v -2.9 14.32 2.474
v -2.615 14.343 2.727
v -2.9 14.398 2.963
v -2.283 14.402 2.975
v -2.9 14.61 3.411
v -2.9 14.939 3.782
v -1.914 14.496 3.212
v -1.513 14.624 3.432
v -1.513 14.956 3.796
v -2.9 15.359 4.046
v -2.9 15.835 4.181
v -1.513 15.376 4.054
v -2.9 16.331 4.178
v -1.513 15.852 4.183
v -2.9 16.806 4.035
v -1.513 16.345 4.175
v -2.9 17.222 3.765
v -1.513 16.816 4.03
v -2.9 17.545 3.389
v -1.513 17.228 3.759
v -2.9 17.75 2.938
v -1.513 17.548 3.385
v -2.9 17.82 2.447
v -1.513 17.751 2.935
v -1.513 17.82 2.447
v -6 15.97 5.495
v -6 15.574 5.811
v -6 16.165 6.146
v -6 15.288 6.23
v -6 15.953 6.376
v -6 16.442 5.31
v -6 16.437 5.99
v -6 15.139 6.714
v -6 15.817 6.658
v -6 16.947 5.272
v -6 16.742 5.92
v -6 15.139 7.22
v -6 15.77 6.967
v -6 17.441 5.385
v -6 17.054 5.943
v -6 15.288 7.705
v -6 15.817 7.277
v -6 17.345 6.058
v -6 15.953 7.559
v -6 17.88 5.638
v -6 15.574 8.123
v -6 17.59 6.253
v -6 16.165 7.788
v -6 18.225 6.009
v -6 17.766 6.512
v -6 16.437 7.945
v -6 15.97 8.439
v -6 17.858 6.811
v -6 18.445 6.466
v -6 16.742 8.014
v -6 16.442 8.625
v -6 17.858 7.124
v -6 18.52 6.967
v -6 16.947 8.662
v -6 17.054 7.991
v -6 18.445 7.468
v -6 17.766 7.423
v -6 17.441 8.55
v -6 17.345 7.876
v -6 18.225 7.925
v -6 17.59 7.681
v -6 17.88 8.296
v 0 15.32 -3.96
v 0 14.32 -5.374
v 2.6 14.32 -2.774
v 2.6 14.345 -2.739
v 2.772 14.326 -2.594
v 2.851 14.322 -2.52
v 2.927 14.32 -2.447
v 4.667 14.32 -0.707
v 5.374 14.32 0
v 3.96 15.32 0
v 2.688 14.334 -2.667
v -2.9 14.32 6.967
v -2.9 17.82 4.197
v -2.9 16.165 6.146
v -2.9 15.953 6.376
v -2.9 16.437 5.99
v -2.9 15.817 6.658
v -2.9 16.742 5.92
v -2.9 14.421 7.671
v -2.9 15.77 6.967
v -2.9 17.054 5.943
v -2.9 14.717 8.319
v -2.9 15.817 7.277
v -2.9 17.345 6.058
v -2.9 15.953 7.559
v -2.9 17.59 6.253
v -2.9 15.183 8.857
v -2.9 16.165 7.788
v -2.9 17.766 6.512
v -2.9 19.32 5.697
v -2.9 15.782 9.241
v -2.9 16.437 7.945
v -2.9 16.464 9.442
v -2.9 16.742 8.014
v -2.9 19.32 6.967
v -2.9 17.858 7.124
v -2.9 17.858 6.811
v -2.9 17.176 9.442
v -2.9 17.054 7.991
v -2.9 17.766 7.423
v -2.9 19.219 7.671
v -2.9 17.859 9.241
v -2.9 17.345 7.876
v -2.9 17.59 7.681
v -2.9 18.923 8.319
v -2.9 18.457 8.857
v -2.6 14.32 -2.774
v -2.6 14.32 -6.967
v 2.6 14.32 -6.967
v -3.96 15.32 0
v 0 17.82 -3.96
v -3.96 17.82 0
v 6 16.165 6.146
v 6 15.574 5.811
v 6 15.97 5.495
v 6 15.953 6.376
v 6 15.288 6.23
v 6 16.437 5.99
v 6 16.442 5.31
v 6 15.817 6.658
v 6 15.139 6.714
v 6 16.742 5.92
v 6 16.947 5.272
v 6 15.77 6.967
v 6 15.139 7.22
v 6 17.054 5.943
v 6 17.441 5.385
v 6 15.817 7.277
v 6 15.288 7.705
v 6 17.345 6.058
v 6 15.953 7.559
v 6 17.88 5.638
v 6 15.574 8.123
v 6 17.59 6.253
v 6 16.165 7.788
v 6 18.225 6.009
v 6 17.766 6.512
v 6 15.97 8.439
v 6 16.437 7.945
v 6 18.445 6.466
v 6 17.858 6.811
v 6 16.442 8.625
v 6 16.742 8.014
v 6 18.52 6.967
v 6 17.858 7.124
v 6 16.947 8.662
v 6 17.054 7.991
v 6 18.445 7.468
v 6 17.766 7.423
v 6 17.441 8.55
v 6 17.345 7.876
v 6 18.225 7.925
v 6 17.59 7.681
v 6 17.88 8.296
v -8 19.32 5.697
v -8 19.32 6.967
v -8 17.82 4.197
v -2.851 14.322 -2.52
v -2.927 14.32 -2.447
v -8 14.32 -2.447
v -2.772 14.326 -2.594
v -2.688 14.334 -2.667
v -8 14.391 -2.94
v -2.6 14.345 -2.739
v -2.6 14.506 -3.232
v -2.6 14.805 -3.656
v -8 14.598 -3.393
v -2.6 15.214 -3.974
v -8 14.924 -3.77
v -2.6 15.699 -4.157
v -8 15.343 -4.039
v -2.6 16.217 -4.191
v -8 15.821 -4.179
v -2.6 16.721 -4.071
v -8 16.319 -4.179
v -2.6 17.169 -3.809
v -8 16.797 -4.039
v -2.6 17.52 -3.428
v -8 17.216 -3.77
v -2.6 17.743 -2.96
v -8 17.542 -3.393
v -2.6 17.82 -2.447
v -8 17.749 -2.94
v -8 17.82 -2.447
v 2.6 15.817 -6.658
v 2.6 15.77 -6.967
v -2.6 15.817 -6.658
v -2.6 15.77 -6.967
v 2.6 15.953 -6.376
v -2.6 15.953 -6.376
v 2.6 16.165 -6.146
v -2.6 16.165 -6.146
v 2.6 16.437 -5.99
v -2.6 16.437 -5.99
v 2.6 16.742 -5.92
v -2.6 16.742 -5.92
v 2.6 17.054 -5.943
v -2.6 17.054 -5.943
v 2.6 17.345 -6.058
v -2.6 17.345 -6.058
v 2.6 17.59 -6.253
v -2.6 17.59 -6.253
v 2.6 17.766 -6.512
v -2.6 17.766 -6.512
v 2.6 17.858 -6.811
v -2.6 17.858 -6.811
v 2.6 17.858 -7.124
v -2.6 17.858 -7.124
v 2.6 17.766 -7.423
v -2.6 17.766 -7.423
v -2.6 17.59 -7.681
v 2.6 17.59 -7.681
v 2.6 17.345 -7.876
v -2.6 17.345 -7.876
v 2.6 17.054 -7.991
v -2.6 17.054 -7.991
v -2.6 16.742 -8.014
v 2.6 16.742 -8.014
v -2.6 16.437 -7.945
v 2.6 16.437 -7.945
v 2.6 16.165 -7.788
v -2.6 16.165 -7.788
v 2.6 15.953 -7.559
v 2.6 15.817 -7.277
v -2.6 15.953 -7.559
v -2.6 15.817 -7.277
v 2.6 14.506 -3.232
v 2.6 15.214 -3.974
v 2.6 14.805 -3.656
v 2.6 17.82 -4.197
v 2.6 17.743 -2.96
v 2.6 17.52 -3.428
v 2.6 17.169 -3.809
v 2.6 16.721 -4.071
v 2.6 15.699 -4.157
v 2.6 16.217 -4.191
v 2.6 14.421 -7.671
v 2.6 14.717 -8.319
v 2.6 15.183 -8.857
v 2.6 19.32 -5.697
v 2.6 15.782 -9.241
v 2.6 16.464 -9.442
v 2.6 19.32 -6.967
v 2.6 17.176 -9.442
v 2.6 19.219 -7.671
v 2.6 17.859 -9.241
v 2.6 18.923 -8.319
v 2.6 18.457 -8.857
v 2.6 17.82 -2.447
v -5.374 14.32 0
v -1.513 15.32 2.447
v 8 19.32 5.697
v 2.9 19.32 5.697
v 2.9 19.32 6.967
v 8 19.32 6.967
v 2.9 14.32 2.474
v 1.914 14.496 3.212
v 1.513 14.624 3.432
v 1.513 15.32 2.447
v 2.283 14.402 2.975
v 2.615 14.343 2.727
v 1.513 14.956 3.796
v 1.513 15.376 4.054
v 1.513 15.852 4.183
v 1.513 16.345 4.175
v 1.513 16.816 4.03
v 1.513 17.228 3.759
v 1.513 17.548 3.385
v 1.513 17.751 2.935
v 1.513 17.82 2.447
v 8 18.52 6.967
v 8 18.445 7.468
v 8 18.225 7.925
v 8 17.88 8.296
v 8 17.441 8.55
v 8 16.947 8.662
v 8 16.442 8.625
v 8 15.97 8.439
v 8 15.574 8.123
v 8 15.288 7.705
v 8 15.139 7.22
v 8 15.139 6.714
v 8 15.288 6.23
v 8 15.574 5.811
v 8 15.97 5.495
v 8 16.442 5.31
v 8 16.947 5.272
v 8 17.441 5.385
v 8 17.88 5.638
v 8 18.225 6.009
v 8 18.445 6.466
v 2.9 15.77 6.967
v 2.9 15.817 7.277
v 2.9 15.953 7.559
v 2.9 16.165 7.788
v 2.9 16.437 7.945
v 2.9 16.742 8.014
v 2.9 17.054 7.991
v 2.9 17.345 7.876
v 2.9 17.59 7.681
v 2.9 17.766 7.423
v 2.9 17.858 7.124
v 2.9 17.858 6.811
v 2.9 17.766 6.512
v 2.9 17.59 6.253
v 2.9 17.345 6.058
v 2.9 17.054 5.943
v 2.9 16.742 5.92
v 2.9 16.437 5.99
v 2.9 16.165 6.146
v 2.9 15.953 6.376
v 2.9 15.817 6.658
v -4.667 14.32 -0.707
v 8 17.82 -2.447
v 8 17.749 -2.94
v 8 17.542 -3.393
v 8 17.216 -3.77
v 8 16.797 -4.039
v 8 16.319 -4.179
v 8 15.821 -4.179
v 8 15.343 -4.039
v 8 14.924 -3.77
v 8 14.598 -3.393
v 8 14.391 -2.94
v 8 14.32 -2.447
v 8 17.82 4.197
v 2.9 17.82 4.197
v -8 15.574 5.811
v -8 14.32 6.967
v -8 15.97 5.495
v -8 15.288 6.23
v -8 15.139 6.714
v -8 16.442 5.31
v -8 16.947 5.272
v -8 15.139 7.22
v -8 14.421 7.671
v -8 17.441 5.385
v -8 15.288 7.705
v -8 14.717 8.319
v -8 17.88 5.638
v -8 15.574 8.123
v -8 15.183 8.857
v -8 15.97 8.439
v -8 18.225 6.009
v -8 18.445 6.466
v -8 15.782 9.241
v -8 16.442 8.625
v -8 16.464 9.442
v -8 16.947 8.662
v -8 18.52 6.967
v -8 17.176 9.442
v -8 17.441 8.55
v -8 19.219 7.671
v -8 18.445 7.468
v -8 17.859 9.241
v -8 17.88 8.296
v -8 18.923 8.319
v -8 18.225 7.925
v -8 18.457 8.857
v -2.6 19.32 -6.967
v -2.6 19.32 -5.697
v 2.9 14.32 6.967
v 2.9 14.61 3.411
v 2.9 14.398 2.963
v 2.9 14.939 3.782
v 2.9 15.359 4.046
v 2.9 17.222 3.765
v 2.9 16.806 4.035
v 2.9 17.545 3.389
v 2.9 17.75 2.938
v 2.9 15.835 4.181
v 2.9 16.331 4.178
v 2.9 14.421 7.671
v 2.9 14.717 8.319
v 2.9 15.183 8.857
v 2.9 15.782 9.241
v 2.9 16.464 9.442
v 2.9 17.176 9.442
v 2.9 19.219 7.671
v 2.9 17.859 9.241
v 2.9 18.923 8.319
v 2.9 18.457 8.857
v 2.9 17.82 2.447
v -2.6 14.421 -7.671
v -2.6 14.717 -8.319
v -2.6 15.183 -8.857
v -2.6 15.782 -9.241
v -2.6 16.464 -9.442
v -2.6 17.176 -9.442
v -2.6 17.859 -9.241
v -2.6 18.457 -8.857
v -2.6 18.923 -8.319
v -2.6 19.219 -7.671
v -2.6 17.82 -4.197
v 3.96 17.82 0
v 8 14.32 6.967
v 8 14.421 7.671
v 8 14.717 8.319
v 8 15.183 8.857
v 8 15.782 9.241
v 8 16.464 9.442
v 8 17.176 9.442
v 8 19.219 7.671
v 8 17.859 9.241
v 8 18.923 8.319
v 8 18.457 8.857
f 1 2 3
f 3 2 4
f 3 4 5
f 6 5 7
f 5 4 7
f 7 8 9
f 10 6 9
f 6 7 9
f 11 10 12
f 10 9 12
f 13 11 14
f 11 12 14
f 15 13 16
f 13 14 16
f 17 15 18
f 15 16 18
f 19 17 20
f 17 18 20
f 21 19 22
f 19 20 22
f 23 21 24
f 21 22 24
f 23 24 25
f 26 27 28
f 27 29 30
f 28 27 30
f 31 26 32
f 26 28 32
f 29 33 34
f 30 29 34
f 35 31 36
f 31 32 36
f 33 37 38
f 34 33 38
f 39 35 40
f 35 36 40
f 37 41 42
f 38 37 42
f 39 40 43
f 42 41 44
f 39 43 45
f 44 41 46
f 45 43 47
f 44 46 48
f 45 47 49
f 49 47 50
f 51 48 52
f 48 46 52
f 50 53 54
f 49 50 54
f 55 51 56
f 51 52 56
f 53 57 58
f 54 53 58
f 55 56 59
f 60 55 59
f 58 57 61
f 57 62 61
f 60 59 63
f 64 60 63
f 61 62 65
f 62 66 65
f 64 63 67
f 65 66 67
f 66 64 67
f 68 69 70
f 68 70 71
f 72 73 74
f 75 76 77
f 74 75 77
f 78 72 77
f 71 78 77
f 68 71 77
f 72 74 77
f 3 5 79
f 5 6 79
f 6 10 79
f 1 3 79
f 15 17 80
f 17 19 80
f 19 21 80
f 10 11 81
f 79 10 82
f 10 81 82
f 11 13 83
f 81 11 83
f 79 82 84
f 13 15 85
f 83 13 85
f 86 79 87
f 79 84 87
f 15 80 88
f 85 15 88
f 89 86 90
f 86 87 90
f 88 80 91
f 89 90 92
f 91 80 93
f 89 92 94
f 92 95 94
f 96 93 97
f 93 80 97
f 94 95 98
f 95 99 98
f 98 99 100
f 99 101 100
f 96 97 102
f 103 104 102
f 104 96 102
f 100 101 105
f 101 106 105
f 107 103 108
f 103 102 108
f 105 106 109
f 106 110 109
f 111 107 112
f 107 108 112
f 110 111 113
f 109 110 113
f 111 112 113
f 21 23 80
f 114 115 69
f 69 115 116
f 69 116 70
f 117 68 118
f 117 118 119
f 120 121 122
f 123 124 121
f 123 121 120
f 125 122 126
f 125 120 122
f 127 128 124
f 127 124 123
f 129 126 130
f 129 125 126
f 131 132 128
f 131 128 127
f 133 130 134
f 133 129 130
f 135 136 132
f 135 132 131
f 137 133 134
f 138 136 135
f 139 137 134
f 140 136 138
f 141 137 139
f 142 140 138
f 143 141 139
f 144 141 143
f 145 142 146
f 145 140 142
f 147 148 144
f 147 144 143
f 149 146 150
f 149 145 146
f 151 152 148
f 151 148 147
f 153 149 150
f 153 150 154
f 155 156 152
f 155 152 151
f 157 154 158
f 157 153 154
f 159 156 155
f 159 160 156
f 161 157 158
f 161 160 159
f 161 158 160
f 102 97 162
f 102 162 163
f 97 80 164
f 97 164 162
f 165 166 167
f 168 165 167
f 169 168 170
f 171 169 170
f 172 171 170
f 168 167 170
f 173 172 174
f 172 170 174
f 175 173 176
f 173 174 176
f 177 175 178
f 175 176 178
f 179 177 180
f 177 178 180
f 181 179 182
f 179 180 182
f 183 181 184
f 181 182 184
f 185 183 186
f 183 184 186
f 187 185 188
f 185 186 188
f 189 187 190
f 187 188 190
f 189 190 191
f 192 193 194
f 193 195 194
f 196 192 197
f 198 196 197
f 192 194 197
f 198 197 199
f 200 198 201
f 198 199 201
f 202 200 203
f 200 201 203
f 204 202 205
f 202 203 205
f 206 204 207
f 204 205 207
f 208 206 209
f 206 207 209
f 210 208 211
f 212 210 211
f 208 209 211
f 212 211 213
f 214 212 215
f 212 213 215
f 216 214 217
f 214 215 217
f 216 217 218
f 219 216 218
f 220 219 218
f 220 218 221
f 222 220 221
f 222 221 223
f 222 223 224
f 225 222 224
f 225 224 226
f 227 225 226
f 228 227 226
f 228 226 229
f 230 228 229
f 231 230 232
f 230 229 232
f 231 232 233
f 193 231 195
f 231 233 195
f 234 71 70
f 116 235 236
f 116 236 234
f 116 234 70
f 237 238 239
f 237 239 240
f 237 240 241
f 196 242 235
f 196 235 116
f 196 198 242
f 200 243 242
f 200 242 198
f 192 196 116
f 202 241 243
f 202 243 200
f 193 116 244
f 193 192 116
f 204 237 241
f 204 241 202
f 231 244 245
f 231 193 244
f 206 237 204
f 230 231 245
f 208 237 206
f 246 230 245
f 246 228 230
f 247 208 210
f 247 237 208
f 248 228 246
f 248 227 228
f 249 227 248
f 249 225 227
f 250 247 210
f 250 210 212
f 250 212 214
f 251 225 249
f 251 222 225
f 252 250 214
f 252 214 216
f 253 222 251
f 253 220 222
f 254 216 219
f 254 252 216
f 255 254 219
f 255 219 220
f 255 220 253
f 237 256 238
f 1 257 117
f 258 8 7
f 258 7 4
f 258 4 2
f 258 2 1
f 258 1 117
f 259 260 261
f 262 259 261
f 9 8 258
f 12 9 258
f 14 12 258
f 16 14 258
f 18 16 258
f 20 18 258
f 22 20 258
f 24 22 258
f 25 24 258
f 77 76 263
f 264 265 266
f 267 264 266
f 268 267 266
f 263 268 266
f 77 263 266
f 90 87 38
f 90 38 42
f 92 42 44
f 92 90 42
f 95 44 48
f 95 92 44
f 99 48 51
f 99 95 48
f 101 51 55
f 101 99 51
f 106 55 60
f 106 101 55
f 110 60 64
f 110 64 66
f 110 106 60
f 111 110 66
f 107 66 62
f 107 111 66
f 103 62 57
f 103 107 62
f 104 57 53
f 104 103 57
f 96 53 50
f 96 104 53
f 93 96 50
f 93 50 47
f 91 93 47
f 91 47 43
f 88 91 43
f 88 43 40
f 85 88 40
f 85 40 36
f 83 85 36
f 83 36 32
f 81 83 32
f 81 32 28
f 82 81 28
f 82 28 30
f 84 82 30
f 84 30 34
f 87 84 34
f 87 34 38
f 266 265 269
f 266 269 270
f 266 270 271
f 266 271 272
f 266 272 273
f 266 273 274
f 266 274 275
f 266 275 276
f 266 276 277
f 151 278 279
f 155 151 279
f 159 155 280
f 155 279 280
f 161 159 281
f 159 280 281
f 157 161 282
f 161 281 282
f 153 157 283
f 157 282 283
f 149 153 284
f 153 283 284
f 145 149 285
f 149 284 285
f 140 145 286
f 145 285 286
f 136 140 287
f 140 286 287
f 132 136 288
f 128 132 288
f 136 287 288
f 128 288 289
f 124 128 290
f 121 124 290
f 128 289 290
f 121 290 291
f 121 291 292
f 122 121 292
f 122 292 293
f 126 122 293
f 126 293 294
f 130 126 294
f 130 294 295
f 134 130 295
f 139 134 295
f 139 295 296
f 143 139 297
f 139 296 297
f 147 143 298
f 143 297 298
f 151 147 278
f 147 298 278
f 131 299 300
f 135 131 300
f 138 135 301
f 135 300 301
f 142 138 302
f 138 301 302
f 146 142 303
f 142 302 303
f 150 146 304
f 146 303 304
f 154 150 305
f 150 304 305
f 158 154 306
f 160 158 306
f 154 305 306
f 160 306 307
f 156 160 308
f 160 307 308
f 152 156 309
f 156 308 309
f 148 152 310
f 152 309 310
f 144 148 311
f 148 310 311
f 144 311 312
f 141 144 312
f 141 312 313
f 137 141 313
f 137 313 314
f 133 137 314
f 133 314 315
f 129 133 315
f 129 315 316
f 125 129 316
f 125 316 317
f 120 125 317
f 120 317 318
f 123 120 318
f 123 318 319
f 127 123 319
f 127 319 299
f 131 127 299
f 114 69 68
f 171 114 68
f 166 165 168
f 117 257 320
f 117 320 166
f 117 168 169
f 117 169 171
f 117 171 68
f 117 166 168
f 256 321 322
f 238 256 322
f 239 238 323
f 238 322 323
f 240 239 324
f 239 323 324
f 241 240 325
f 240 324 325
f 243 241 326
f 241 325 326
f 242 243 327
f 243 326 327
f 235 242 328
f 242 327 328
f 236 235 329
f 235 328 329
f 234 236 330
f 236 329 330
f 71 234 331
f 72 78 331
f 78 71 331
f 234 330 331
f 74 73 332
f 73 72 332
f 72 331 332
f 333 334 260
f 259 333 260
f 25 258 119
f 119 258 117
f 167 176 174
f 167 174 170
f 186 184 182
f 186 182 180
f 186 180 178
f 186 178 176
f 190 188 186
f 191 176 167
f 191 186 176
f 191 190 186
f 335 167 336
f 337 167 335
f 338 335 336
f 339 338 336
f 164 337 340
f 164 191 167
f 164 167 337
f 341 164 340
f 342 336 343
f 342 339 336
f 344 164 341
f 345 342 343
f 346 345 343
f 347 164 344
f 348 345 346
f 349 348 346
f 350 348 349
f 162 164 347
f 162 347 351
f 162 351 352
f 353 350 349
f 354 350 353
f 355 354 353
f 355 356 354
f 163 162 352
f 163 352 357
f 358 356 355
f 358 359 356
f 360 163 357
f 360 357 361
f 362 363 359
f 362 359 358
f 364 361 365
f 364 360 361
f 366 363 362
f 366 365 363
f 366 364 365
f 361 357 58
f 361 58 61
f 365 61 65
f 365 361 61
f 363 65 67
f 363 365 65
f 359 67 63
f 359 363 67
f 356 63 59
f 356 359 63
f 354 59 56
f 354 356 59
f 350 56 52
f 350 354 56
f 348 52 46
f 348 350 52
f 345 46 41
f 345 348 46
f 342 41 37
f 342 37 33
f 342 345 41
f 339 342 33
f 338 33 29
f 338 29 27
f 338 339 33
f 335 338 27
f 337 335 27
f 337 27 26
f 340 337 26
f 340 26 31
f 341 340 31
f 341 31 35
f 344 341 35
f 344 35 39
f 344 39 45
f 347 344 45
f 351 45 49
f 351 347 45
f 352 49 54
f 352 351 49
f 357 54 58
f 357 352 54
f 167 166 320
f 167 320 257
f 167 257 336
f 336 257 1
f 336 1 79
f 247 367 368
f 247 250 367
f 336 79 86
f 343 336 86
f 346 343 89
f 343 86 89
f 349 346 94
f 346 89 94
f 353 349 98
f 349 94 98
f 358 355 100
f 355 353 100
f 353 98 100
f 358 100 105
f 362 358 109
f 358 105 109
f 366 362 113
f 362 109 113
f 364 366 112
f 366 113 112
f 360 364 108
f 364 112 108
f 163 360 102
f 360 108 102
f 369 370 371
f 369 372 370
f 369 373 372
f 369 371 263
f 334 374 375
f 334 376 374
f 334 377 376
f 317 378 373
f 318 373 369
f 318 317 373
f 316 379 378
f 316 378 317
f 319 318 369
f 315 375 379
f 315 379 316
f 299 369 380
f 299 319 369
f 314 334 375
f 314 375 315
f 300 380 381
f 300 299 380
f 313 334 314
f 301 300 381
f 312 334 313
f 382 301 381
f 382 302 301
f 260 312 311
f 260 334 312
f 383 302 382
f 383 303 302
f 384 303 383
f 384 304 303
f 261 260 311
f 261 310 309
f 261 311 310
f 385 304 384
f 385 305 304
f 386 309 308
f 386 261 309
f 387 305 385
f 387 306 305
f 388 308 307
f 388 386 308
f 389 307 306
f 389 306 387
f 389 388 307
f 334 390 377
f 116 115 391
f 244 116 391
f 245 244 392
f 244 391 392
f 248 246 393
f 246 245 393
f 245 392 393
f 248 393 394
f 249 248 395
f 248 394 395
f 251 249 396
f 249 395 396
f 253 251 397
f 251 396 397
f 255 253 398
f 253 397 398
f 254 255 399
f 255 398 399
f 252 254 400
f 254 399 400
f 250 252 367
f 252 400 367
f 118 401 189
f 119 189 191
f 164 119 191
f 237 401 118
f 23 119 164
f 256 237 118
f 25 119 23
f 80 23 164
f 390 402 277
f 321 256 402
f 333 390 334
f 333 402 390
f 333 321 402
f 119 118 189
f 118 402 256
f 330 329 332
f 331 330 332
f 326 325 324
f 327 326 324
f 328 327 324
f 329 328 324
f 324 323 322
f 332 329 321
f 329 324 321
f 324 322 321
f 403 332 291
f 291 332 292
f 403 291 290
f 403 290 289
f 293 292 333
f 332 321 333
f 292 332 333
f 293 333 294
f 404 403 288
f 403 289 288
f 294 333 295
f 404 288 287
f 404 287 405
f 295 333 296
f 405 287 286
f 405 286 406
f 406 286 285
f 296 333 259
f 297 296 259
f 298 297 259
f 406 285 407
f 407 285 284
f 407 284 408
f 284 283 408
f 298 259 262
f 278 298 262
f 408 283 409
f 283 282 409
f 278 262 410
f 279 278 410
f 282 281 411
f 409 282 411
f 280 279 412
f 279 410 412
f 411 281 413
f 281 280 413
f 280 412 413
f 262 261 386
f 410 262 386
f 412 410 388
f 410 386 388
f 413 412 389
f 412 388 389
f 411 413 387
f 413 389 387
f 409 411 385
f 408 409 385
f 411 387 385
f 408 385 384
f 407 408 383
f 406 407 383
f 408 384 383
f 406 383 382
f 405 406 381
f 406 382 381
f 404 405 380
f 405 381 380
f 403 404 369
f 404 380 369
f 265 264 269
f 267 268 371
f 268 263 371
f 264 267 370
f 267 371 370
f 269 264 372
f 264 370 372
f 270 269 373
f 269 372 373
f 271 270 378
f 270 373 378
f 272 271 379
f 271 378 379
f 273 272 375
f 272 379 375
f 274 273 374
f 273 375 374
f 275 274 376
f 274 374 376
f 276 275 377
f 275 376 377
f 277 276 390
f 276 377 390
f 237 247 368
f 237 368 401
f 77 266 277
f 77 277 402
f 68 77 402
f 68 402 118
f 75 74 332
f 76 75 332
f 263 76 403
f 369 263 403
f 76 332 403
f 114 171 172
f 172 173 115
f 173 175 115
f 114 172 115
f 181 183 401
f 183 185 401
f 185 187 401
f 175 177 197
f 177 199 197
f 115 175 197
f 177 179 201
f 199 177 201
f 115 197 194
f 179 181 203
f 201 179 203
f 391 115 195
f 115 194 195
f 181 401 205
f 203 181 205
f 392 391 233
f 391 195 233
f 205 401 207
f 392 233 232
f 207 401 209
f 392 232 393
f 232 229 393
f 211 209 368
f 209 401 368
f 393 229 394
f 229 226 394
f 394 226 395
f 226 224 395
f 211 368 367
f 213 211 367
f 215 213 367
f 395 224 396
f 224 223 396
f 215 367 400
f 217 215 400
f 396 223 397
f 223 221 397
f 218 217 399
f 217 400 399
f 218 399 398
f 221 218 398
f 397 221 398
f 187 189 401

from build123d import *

# Parameters (mm, degrees)
SKETCH3_W           = 18.934254216
SKETCH3_H           = 5
BOSS_EXTRUDE1_DEPTH = 8
CUT_EXTRUDE1_REACH  = 24.954
SKETCH5_R           = 1.05
SKETCH4_W           = 5.27
SKETCH4_H           = 5
CUT_EXTRUDE2_DEPTH  = 2.9
SKETCH6_W           = 5.27
SKETCH6_H           = 5
CUT_EXTRUDE3_DEPTH  = 5.4
CUT_EXTRUDE5_REACH  = 15.365
CUT_EXTRUDE6_REACH  = 24.954
SKETCH10_R          = 1.7
CUT_EXTRUDE9_DEPTH  = 2
FILLET1_R           = 2.5
FILLET2_R           = 1.75
CUT_EXTRUDE7_REACH  = 15.365
SKETCH8_W           = 3.025341734
SKETCH8_H           = 1.75
CHAMFER1_SIZE       = 1


with BuildPart() as part:
    # Sketch3 → Boss-Extrude1 (new body)
    with BuildSketch(Plane.ZY):
        with Locations((0, 16.820132754)):
            Rectangle(SKETCH3_W, SKETCH3_H)
    extrude(amount=-BOSS_EXTRUDE1_DEPTH)

    # Sketch5 → Cut-Extrude1 (cut, up to next)
    with BuildSketch(Plane.ZY, mode=Mode.PRIVATE) as cut_extrude1_sk1:
        with Locations(Location((6.967127108, 16.820132754, 0), (0, 0, 270))):
            Circle(SKETCH5_R)
    cut_extrude1_tool1 = extrude(cut_extrude1_sk1.sketch, amount=-CUT_EXTRUDE1_REACH, mode=Mode.PRIVATE) & part.part
    # Sketch5 → Cut-Extrude1 (cut, up to next)
    with BuildSketch(Plane.ZY, mode=Mode.PRIVATE) as cut_extrude1_sk2:
        with Locations(Location((-6.967127108, 16.820132754, 0), (0, 0, 270))):
            Circle(SKETCH5_R)
    cut_extrude1_tool2 = extrude(cut_extrude1_sk2.sketch, amount=-CUT_EXTRUDE1_REACH, mode=Mode.PRIVATE) & part.part
    add(cut_extrude1_tool1.solids().sort_by_distance((0, 16.820133, 6.967127))[0], mode=Mode.SUBTRACT)
    add(cut_extrude1_tool2.solids().sort_by_distance((0, 16.820133, -6.967127))[0], mode=Mode.SUBTRACT)

    # Sketch4 → Cut-Extrude2 (cut)
    with BuildSketch(Plane.ZY):
        with Locations((6.832127108, 16.820132754)):
            Rectangle(SKETCH4_W, SKETCH4_H)
    extrude(amount=-CUT_EXTRUDE2_DEPTH, mode=Mode.SUBTRACT)

    # Sketch6 → Cut-Extrude3 (cut)
    with BuildSketch(Plane(origin=(8, 0, 0), x_dir=(0, 0, -1), z_dir=(1, 0, 0))):
        with Locations((6.832127108, 16.820132754)):
            Rectangle(SKETCH6_W, SKETCH6_H)
    extrude(amount=-CUT_EXTRUDE3_DEPTH, mode=Mode.SUBTRACT)

    # Sketch1 → Cut-Extrude5 (cut, up to next)
    with BuildSketch(Plane(origin=(0, 14.320132754, 0), x_dir=(-1, 0, 0), z_dir=(0, -1, 0)), mode=Mode.PRIVATE) as cut_extrude5_sk1:
        Polygon((3.959797975, 0), (0, -3.959797975), (-3.959797975, 0), (0, 3.959797975), align=None)
    cut_extrude5_tool1 = extrude(cut_extrude5_sk1.sketch, amount=-CUT_EXTRUDE5_REACH, mode=Mode.PRIVATE) & part.part
    add(cut_extrude5_tool1.solids().sort_by_distance((0, 14.320133, 0))[0], mode=Mode.SUBTRACT)

    # Sketch7 → Cut-Extrude6 (cut, up to next)
    with BuildSketch(Plane.ZY, mode=Mode.PRIVATE) as cut_extrude6_sk1:
        Polygon((-4.197127108, 17.820132754), (4.197127108, 17.820132754), (5.697127108, 19.320132754), (-5.697127108, 19.320132754), align=None)
    cut_extrude6_tool1 = extrude(cut_extrude6_sk1.sketch, amount=-CUT_EXTRUDE6_REACH, mode=Mode.PRIVATE) & part.part
    add(cut_extrude6_tool1.solids().sort_by_distance((0, 18.608034, 0))[0], mode=Mode.SUBTRACT)

    # Sketch10 → Cut-Extrude9 (cut)
    with BuildSketch(Plane(origin=(8, 0, 0), x_dir=(0, 0, -1), z_dir=(1, 0, 0))):
        with Locations(Location((-6.967127108, 16.820132754, 0), (0, 0, 90))):
            Circle(SKETCH10_R)
    extrude(amount=-CUT_EXTRUDE9_DEPTH, mode=Mode.SUBTRACT)

    # Mirror2: part across plane


with BuildPart() as part_1:
    add(part.part)
    add(part.part.mirror(Plane(origin=(0, 0, 0), x_dir=(0, 0, 1), z_dir=(1, 0, 0))))

    # Fillet1
    # the kernel refuses this fillet: 2.5 mm, written as the material it takes off along each edge
    with BuildSketch(Plane(origin=(3.35, 14.320132754, 9.467127108), x_dir=(0, 0, -1), z_dir=(-1, 0, 0)), Plane(origin=(-3.35, 19.320132754, 9.467127108), x_dir=(0, 0, -1), z_dir=(1, 0, 0))) as fillet1_piece_1:
        with BuildLine():
            CenterArc((FILLET1_R, -FILLET1_R), FILLET1_R, 90, 90)
            Line((0, -FILLET1_R), (0, 0))
            Line((0, 0), (FILLET1_R, 0))
        make_face()
    extrude(amount=17.6, mode=Mode.SUBTRACT)
    with BuildSketch(Plane(origin=(3.35, 19.320132754, 9.467127108), x_dir=(0, 0, -1), z_dir=(-1, 0, 0)), Plane(origin=(-3.35, 14.320132754, 9.467127108), x_dir=(0, 0, -1), z_dir=(1, 0, 0))) as fillet1_piece_2:
        with BuildLine():
            CenterArc((FILLET1_R, FILLET1_R), FILLET1_R, 180, 90)
            Line((0, FILLET1_R), (0, 0))
            Line((0, 0), (FILLET1_R, 0))
        make_face()
    extrude(amount=17.6, mode=Mode.SUBTRACT)
    with BuildSketch(Plane(origin=(-8.85, 14.320132754, -9.467127108), x_dir=(0, 0, 1), z_dir=(1, 0, 0))) as fillet1_piece_3:
        with BuildLine():
            CenterArc((FILLET1_R, -FILLET1_R), FILLET1_R, 90, 90)
            Line((0, -FILLET1_R), (0, 0))
            Line((0, 0), (FILLET1_R, 0))
        make_face()
    extrude(amount=17.7, mode=Mode.SUBTRACT)
    with BuildSketch(Plane(origin=(-8.85, 19.320132754, -9.467127108), x_dir=(0, 0, 1), z_dir=(1, 0, 0))) as fillet1_piece_4:
        with BuildLine():
            CenterArc((FILLET1_R, FILLET1_R), FILLET1_R, 180, 90)
            Line((0, FILLET1_R), (0, 0))
            Line((0, 0), (FILLET1_R, 0))
        make_face()
    extrude(amount=17.7, mode=Mode.SUBTRACT)

    # Fillet2
    # the kernel refuses this fillet: 1.75 mm, written as the material it takes off along each edge
    with BuildSketch(Plane(origin=(2.9, 14.320132754, 4.197127108), x_dir=(0, 0, -1), z_dir=(-1, 0, 0))) as fillet2_piece_1:
        with BuildLine():
            CenterArc((FILLET2_R, -FILLET2_R), FILLET2_R, 90, 90)
            Line((0, -FILLET2_R), (0, 0))
            Line((0, 0), (FILLET2_R, 0))
        make_face()
    extrude(amount=5.8, mode=Mode.SUBTRACT)
    with BuildSketch(Plane(origin=(2.9, 17.820132754, 4.197127108), x_dir=(0, 0, -1), z_dir=(-1, 0, 0))) as fillet2_piece_2:
        with BuildLine():
            CenterArc((FILLET2_R, FILLET2_R), FILLET2_R, 180, 90)
            Line((0, FILLET2_R), (0, 0))
            Line((0, 0), (FILLET2_R, 0))
        make_face()
    extrude(amount=5.8, mode=Mode.SUBTRACT)
    with BuildSketch(Plane(origin=(12.375, 14.320132754, -4.197127108), x_dir=(0, 0, 1), z_dir=(-1, 0, 0)), Plane(origin=(2.6, 17.820132754, -4.197127108), x_dir=(0, 0, 1), z_dir=(1, 0, 0))) as fillet2_piece_3:
        with BuildLine():
            CenterArc((FILLET2_R, FILLET2_R), FILLET2_R, 180, 90)
            Line((0, FILLET2_R), (0, 0))
            Line((0, 0), (FILLET2_R, 0))
        make_face()
    extrude(amount=9.775, mode=Mode.SUBTRACT)
    with BuildSketch(Plane(origin=(-12.375, 14.320132754, -4.197127108), x_dir=(0, 0, 1), z_dir=(1, 0, 0)), Plane(origin=(-2.6, 17.820132754, -4.197127108), x_dir=(0, 0, 1), z_dir=(-1, 0, 0))) as fillet2_piece_4:
        with BuildLine():
            CenterArc((FILLET2_R, -FILLET2_R), FILLET2_R, 90, 90)
            Line((0, -FILLET2_R), (0, 0))
            Line((0, 0), (FILLET2_R, 0))
        make_face()
    extrude(amount=9.775, mode=Mode.SUBTRACT)

    # Sketch8 → Cut-Extrude7 (cut, up to next)
    with BuildSketch(Plane(origin=(0, 14.320132754, 0), x_dir=(1, 0, 0), z_dir=(0, 1, 0)), mode=Mode.PRIVATE) as cut_extrude7_sk1:
        with Locations((0, -3.322127108)):
            Rectangle(SKETCH8_W, SKETCH8_H)
    cut_extrude7_tool1 = extrude(cut_extrude7_sk1.sketch, amount=CUT_EXTRUDE7_REACH, mode=Mode.PRIVATE) & part_1.part
    add(cut_extrude7_tool1.solids().sort_by_distance((0, 14.320133, 3.322127))[0], mode=Mode.SUBTRACT)

    # Chamfer1
    # the kernel refuses this chamfer: 1 mm, written as the material it takes off along each edge
    with BuildSketch(Plane(origin=(0.305783613, 14.320132754, 4.265581587), x_dir=(-0.7068394360706736, -0.027495876610585612, 0.7068394360706735), z_dir=(-0.7071067811865476, 0, -0.7071067811865476))) as chamfer1_piece_1:
        Polygon((CHAMFER1_SIZE * 0.999621916911, CHAMFER1_SIZE * 0.0274958766106), (-CHAMFER1_SIZE * 0.0274958766106, CHAMFER1_SIZE * 0.999621916911), (0, 0), align=None)
    extrude(amount=6.032443332, mode=Mode.SUBTRACT)
    with BuildSketch(Plane(origin=(-0.305783613, 14.320132754, 4.265581587), x_dir=(0.7068394360706735, -0.027495876610585612, 0.7068394360706735), z_dir=(0.7071067811865476, 0, -0.7071067811865476))) as chamfer1_piece_2:
        Polygon((CHAMFER1_SIZE * 0.999621916911, -CHAMFER1_SIZE * 0.0274958766106), (-CHAMFER1_SIZE * 0.0274958766106, -CHAMFER1_SIZE * 0.999621916911), (0, 0), align=None)
    extrude(amount=6.032443332, mode=Mode.SUBTRACT)
    with BuildSketch(Plane(origin=(3.959797975, 14.320132754, 0), x_dir=(0.7068394360706735, -0.027495876610590834, -0.7068394360706735), z_dir=(-0.7071067811865476, 0, -0.7071067811865476))) as chamfer1_piece_3:
        Polygon((CHAMFER1_SIZE * 0.999621916911, -CHAMFER1_SIZE * 0.0274958766106), (-CHAMFER1_SIZE * 0.0274958766106, -CHAMFER1_SIZE * 0.999621916911), (0, 0), align=None)
    extrude(amount=5.6, mode=Mode.SUBTRACT)
    with BuildSketch(Plane(origin=(-3.959797975, 14.320132754, 0), x_dir=(-0.7068394360706735, -0.027495876610590834, -0.7068394360706735), z_dir=(0.7071067811865476, 0, -0.7071067811865476))) as chamfer1_piece_4:
        Polygon((CHAMFER1_SIZE * 0.999621916911, CHAMFER1_SIZE * 0.0274958766106), (-CHAMFER1_SIZE * 0.0274958766106, CHAMFER1_SIZE * 0.999621916911), (0, 0), align=None)
    extrude(amount=5.6, mode=Mode.SUBTRACT)
    with BuildSketch(Plane(origin=(-5.778252454, 14.320132754, 1.81845448), x_dir=(-0.7068394360706735, -0.027495876610585616, -0.7068394360706735), z_dir=(0.7071067811865476, 0, -0.7071067811865476))) as chamfer1_piece_5a_section:
        Polygon((CHAMFER1_SIZE * 0.999621916911, CHAMFER1_SIZE * 0.0274958766106), (-CHAMFER1_SIZE * 0.0274958766106, CHAMFER1_SIZE * 0.999621916911), (0, 0), align=None)
    chamfer1_piece_5a = extrude(amount=8.171682988, mode=Mode.PRIVATE)
    chamfer1_piece_5a = split(chamfer1_piece_5a, bisect_by=Plane(origin=(-4.192997285, 14.649926381, -0.23319931), z_dir=(-0.7071067811865476, 0, 0.7071067811865476)), keep=Keep.TOP, mode=Mode.PRIVATE)
    with BuildSketch(Plane(origin=(0.305783613, 14.320132754, 4.265581587), x_dir=(-0.7068394360706736, -0.027495876610585612, 0.7068394360706735), z_dir=(-0.7071067811865476, 0, -0.7071067811865476))) as chamfer1_piece_5b_section:
        Polygon((CHAMFER1_SIZE * 0.999621916911, CHAMFER1_SIZE * 0.0274958766106), (-CHAMFER1_SIZE * 0.0274958766106, CHAMFER1_SIZE * 0.999621916911), (0, 0), align=None)
    chamfer1_piece_5b = extrude(amount=8.60412632, mode=Mode.PRIVATE)
    chamfer1_piece_5b = split(chamfer1_piece_5b, bisect_by=Plane(origin=(-4.192997285, 14.649926381, 0.23319931), z_dir=(-0.7071067811865476, 0, -0.7071067811865476)), keep=Keep.TOP, mode=Mode.PRIVATE)
    chamfer1_piece_5 = chamfer1_piece_5a & chamfer1_piece_5b
    add(chamfer1_piece_5, mode=Mode.SUBTRACT)
    with BuildSketch(Plane(origin=(-0.305783613, 14.320132754, 4.265581587), x_dir=(0.7068394360706735, -0.027495876610585612, 0.7068394360706735), z_dir=(0.7071067811865476, 0, -0.7071067811865476))) as chamfer1_piece_6a_section:
        Polygon((CHAMFER1_SIZE * 0.999621916911, -CHAMFER1_SIZE * 0.0274958766106), (-CHAMFER1_SIZE * 0.0274958766106, -CHAMFER1_SIZE * 0.999621916911), (0, 0), align=None)
    chamfer1_piece_6a = extrude(amount=8.60412632, mode=Mode.PRIVATE)
    chamfer1_piece_6a = split(chamfer1_piece_6a, bisect_by=Plane(origin=(4.192997285, 14.649926381, 0.23319931), z_dir=(0.7071067811865476, 0, -0.7071067811865476)), keep=Keep.TOP, mode=Mode.PRIVATE)
    with BuildSketch(Plane(origin=(5.778252454, 14.320132754, 1.81845448), x_dir=(0.7068394360706736, -0.027495876610585605, -0.7068394360706736), z_dir=(-0.7071067811865476, 0, -0.7071067811865476))) as chamfer1_piece_6b_section:
        Polygon((CHAMFER1_SIZE * 0.999621916911, -CHAMFER1_SIZE * 0.0274958766106), (-CHAMFER1_SIZE * 0.0274958766106, -CHAMFER1_SIZE * 0.999621916911), (0, 0), align=None)
    chamfer1_piece_6b = extrude(amount=8.171682988, mode=Mode.PRIVATE)
    chamfer1_piece_6b = split(chamfer1_piece_6b, bisect_by=Plane(origin=(4.192997285, 14.649926381, -0.23319931), z_dir=(0.7071067811865476, 0, 0.7071067811865476)), keep=Keep.TOP, mode=Mode.PRIVATE)
    chamfer1_piece_6 = chamfer1_piece_6a & chamfer1_piece_6b
    add(chamfer1_piece_6, mode=Mode.SUBTRACT)
    with BuildSketch(Plane(origin=(3.959797975, 14.320132754, 0), x_dir=(0.7068394360706735, -0.027495876610590834, -0.7068394360706735), z_dir=(-0.7071067811865476, 0, -0.7071067811865476))) as chamfer1_piece_7a_section:
        Polygon((CHAMFER1_SIZE * 0.999621916911, -CHAMFER1_SIZE * 0.0274958766106), (-CHAMFER1_SIZE * 0.0274958766106, -CHAMFER1_SIZE * 0.999621916911), (0, 0), align=None)
    chamfer1_piece_7a = extrude(amount=8.171682988, mode=Mode.PRIVATE)
    chamfer1_piece_7a = split(chamfer1_piece_7a, bisect_by=Plane(origin=(0.23319931, 14.649926381, -4.192997285), z_dir=(-0.7071067811865476, 0, -0.7071067811865476)), keep=Keep.TOP, mode=Mode.PRIVATE)
    with BuildSketch(Plane(origin=(-3.959797975, 14.320132754, 0), x_dir=(-0.7068394360706735, -0.027495876610590834, -0.7068394360706735), z_dir=(0.7071067811865476, 0, -0.7071067811865476))) as chamfer1_piece_7b_section:
        Polygon((CHAMFER1_SIZE * 0.999621916911, CHAMFER1_SIZE * 0.0274958766106), (-CHAMFER1_SIZE * 0.0274958766106, CHAMFER1_SIZE * 0.999621916911), (0, 0), align=None)
    chamfer1_piece_7b = extrude(amount=8.171682988, mode=Mode.PRIVATE)
    chamfer1_piece_7b = split(chamfer1_piece_7b, bisect_by=Plane(origin=(-0.23319931, 14.649926381, -4.192997285), z_dir=(0.7071067811865476, 0, -0.7071067811865476)), keep=Keep.TOP, mode=Mode.PRIVATE)
    chamfer1_piece_7 = chamfer1_piece_7a & chamfer1_piece_7b
    add(chamfer1_piece_7, mode=Mode.SUBTRACT)


solid = part_1.part
